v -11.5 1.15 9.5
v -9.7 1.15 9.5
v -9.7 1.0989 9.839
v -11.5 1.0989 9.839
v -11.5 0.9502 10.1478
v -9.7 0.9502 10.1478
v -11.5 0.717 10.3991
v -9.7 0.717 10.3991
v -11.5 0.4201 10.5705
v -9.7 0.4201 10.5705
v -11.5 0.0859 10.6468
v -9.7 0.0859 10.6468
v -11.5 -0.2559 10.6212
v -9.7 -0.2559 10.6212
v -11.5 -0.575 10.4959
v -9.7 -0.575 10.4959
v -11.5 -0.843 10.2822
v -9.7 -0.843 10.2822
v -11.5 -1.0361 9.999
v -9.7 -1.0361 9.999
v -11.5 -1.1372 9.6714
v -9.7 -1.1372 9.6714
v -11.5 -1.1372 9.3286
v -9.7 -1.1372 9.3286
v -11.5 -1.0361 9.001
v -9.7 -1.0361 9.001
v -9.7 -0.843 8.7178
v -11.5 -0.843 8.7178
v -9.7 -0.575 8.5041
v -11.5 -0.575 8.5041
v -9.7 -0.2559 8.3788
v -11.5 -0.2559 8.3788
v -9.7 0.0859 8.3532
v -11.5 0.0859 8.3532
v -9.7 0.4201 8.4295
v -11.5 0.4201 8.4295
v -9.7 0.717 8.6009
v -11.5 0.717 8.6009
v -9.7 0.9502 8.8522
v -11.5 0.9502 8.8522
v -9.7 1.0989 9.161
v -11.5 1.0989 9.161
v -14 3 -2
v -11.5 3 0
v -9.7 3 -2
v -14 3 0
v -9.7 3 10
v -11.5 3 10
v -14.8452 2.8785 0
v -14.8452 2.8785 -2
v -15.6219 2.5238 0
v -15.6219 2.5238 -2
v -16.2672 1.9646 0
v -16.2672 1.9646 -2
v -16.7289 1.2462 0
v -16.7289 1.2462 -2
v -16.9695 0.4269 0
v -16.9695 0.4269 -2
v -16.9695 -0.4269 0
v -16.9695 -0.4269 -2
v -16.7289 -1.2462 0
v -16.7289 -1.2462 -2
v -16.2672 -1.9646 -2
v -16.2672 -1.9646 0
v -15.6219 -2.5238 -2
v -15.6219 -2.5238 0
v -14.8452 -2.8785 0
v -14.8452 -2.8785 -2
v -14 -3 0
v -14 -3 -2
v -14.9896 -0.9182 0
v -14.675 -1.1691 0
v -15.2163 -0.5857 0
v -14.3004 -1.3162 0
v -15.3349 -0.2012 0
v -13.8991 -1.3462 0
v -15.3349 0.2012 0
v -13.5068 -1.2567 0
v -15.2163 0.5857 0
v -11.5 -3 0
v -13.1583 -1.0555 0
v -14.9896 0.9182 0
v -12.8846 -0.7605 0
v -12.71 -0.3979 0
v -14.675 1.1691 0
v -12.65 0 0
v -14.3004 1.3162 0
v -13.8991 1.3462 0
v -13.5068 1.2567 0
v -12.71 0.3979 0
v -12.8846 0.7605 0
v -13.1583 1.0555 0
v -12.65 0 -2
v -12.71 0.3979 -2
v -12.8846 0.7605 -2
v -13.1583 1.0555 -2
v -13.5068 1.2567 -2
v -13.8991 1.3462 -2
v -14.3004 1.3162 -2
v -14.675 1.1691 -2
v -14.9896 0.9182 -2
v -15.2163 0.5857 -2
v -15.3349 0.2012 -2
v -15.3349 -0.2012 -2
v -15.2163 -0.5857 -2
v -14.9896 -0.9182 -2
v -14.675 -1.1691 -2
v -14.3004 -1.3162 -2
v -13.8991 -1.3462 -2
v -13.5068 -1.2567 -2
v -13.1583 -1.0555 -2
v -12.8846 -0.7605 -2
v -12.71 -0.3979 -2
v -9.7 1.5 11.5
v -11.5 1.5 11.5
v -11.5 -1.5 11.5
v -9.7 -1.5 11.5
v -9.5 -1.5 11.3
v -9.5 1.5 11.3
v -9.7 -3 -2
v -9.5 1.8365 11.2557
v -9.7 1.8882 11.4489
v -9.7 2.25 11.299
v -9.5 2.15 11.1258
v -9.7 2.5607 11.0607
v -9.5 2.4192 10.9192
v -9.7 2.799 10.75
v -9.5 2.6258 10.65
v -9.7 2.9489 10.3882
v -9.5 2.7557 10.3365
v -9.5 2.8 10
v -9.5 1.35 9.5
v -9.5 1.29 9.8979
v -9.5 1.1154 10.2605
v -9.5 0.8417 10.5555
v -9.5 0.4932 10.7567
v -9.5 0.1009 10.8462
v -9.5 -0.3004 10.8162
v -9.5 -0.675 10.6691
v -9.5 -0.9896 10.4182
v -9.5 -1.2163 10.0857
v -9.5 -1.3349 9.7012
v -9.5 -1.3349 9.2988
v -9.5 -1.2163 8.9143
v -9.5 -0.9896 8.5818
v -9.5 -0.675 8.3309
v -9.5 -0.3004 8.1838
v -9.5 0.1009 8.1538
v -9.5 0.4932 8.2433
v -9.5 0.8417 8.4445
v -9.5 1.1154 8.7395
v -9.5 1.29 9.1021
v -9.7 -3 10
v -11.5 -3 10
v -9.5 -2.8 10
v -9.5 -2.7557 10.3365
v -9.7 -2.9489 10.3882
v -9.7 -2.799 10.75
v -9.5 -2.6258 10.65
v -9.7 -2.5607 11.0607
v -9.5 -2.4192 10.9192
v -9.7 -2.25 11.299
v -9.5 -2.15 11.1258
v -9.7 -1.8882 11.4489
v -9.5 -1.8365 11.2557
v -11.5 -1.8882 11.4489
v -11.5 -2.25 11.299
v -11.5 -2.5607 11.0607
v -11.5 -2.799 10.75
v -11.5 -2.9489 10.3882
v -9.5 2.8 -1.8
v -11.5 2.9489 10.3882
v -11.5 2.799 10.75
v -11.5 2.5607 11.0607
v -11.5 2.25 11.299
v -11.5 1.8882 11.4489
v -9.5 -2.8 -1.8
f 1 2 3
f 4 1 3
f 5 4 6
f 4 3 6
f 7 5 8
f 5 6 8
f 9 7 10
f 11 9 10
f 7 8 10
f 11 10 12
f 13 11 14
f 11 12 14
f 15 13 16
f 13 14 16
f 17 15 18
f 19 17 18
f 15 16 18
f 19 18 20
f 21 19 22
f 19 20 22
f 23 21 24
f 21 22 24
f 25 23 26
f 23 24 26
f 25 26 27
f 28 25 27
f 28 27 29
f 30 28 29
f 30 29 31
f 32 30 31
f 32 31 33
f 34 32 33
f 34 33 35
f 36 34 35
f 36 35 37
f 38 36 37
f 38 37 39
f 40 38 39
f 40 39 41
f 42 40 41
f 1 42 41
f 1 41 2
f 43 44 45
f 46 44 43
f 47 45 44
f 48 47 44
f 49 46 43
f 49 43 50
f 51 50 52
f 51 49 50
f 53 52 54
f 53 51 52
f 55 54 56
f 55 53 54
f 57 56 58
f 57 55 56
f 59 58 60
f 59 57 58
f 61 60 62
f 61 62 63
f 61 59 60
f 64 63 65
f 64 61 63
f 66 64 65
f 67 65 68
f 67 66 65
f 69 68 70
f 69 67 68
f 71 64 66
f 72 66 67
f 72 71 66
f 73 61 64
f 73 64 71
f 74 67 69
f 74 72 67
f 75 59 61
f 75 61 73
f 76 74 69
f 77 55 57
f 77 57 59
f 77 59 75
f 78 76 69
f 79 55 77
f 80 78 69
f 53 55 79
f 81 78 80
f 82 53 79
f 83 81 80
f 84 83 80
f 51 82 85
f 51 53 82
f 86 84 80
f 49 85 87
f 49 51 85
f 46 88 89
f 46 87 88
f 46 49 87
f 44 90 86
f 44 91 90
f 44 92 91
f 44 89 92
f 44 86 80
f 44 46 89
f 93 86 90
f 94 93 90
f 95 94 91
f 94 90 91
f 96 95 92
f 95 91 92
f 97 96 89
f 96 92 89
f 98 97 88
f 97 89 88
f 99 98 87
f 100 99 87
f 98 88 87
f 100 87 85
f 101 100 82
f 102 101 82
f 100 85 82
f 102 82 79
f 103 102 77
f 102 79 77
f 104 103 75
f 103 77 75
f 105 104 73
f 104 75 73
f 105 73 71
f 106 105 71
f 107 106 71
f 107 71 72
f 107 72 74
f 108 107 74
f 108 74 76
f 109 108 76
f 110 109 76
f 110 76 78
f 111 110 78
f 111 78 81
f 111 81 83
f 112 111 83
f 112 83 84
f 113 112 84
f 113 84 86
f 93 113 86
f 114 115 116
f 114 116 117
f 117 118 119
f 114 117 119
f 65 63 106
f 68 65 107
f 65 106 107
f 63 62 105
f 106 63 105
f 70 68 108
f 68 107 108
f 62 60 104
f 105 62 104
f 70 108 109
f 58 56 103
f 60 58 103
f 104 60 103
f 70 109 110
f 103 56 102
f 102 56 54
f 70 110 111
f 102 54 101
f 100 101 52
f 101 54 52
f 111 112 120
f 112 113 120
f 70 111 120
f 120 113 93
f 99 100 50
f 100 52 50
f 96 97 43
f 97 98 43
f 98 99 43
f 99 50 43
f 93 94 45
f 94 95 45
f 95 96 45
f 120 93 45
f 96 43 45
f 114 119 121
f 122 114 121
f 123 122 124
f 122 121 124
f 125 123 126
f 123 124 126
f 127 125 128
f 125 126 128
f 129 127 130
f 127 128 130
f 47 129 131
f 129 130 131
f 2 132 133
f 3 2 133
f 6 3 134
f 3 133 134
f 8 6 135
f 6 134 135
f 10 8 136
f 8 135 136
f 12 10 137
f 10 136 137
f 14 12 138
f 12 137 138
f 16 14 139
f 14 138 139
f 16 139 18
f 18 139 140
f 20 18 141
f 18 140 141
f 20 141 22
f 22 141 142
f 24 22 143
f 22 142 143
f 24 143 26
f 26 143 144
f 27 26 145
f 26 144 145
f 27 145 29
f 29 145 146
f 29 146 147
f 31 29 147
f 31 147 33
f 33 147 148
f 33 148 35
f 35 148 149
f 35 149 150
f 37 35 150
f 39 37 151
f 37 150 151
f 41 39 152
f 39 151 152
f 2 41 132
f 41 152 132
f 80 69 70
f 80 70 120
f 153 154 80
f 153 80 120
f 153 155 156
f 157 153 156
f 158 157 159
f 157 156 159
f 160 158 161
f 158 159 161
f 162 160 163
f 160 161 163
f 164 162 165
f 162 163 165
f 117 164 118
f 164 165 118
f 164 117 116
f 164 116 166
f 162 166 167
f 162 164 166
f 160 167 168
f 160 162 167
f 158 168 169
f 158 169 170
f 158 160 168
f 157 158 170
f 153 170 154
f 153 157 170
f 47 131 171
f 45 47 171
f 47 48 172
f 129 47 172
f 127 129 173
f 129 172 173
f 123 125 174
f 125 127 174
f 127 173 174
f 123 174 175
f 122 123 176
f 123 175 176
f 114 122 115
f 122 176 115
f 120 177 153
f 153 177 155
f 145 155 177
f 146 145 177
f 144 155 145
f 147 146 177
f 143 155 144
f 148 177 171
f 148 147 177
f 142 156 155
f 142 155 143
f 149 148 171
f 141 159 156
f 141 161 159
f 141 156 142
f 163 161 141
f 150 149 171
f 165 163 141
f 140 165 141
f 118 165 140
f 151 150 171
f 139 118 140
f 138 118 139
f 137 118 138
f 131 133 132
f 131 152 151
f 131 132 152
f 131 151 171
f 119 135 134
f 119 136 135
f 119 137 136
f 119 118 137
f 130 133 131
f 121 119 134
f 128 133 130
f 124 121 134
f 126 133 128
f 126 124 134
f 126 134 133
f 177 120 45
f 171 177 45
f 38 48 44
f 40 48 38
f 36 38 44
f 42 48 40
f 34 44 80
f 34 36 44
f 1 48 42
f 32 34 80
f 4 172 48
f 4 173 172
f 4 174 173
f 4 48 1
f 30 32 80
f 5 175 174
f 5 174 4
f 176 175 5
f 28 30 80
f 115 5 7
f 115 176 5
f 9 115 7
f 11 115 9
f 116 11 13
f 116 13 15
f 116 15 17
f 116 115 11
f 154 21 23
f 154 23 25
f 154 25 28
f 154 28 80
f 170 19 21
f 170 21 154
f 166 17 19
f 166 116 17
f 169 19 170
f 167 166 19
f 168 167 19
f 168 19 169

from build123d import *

# Parameters (mm, degrees)
F0_R     = 1.35
F1_W     = 2
F1_H     = 6
F5_R     = 1.15
F6_DEPTH = 17.001
F7_R     = 1.5
F8_SIZE  = 0.2


with BuildPart() as f3:
    # F3: sweep along a path in F2
    with BuildLine(Plane.XZ) as f3_path:
        Line((0, -2), (0, 0))
    # F0 (on Top) → F3 (sweep)
    with BuildSketch(Plane.XY):
        with BuildLine():
            Line((-9.5, -3), (-9.5, 3))
            Line((-9.5, 3), (-14, 3))
            ThreePointArc((-14, 3), (-17, 0), (-14, -3))
            Line((-14, -3), (-9.5, -3))
        make_face()
        with Locations((-14, 0)):
            Circle(F0_R, mode=Mode.SUBTRACT)
    sweep(path=f3_path.line)

    # F4: sweep along a path in F2
    with BuildLine(Plane.XZ) as f4_path:
        Line((0, 0), (0, 11.5))
    # F1 (on Top) → F4 (sweep)
    with BuildSketch(Plane.XY):
        with Locations((-10.5, 0)):
            Rectangle(F1_W, F1_H)
    sweep(path=f4_path.line)

    # F5 (on Right) → F6 (cut, through all)
    with BuildSketch(Plane.YZ):
        with Locations((0, 9.5)):
            Circle(F5_R)
    extrude(amount=-F6_DEPTH, mode=Mode.SUBTRACT)

    # F7
    f7_edges = [f3.edges().sort_by_distance(p)[0] for p in [
        (-10.5, 3, 11.5),
        (-10.5, -3, 11.5),
    ]]
    fillet(f7_edges, radius=F7_R)

    # F8
    f8_edges = [f3.edges().sort_by_distance(p)[0] for p in [
        (-9.5, -3, 4),
        (-9.5, -2.56066, 11.06066),
        (-9.5, 0, -2),
        (-9.5, 0, 11.5),
        (-9.5, 3, 4),
        (-9.5, 2.56066, 11.06066),
        (-9.5, -1.15, 9.5),
    ]]
    chamfer(f8_edges, length=F8_SIZE)


solid = f3.part
